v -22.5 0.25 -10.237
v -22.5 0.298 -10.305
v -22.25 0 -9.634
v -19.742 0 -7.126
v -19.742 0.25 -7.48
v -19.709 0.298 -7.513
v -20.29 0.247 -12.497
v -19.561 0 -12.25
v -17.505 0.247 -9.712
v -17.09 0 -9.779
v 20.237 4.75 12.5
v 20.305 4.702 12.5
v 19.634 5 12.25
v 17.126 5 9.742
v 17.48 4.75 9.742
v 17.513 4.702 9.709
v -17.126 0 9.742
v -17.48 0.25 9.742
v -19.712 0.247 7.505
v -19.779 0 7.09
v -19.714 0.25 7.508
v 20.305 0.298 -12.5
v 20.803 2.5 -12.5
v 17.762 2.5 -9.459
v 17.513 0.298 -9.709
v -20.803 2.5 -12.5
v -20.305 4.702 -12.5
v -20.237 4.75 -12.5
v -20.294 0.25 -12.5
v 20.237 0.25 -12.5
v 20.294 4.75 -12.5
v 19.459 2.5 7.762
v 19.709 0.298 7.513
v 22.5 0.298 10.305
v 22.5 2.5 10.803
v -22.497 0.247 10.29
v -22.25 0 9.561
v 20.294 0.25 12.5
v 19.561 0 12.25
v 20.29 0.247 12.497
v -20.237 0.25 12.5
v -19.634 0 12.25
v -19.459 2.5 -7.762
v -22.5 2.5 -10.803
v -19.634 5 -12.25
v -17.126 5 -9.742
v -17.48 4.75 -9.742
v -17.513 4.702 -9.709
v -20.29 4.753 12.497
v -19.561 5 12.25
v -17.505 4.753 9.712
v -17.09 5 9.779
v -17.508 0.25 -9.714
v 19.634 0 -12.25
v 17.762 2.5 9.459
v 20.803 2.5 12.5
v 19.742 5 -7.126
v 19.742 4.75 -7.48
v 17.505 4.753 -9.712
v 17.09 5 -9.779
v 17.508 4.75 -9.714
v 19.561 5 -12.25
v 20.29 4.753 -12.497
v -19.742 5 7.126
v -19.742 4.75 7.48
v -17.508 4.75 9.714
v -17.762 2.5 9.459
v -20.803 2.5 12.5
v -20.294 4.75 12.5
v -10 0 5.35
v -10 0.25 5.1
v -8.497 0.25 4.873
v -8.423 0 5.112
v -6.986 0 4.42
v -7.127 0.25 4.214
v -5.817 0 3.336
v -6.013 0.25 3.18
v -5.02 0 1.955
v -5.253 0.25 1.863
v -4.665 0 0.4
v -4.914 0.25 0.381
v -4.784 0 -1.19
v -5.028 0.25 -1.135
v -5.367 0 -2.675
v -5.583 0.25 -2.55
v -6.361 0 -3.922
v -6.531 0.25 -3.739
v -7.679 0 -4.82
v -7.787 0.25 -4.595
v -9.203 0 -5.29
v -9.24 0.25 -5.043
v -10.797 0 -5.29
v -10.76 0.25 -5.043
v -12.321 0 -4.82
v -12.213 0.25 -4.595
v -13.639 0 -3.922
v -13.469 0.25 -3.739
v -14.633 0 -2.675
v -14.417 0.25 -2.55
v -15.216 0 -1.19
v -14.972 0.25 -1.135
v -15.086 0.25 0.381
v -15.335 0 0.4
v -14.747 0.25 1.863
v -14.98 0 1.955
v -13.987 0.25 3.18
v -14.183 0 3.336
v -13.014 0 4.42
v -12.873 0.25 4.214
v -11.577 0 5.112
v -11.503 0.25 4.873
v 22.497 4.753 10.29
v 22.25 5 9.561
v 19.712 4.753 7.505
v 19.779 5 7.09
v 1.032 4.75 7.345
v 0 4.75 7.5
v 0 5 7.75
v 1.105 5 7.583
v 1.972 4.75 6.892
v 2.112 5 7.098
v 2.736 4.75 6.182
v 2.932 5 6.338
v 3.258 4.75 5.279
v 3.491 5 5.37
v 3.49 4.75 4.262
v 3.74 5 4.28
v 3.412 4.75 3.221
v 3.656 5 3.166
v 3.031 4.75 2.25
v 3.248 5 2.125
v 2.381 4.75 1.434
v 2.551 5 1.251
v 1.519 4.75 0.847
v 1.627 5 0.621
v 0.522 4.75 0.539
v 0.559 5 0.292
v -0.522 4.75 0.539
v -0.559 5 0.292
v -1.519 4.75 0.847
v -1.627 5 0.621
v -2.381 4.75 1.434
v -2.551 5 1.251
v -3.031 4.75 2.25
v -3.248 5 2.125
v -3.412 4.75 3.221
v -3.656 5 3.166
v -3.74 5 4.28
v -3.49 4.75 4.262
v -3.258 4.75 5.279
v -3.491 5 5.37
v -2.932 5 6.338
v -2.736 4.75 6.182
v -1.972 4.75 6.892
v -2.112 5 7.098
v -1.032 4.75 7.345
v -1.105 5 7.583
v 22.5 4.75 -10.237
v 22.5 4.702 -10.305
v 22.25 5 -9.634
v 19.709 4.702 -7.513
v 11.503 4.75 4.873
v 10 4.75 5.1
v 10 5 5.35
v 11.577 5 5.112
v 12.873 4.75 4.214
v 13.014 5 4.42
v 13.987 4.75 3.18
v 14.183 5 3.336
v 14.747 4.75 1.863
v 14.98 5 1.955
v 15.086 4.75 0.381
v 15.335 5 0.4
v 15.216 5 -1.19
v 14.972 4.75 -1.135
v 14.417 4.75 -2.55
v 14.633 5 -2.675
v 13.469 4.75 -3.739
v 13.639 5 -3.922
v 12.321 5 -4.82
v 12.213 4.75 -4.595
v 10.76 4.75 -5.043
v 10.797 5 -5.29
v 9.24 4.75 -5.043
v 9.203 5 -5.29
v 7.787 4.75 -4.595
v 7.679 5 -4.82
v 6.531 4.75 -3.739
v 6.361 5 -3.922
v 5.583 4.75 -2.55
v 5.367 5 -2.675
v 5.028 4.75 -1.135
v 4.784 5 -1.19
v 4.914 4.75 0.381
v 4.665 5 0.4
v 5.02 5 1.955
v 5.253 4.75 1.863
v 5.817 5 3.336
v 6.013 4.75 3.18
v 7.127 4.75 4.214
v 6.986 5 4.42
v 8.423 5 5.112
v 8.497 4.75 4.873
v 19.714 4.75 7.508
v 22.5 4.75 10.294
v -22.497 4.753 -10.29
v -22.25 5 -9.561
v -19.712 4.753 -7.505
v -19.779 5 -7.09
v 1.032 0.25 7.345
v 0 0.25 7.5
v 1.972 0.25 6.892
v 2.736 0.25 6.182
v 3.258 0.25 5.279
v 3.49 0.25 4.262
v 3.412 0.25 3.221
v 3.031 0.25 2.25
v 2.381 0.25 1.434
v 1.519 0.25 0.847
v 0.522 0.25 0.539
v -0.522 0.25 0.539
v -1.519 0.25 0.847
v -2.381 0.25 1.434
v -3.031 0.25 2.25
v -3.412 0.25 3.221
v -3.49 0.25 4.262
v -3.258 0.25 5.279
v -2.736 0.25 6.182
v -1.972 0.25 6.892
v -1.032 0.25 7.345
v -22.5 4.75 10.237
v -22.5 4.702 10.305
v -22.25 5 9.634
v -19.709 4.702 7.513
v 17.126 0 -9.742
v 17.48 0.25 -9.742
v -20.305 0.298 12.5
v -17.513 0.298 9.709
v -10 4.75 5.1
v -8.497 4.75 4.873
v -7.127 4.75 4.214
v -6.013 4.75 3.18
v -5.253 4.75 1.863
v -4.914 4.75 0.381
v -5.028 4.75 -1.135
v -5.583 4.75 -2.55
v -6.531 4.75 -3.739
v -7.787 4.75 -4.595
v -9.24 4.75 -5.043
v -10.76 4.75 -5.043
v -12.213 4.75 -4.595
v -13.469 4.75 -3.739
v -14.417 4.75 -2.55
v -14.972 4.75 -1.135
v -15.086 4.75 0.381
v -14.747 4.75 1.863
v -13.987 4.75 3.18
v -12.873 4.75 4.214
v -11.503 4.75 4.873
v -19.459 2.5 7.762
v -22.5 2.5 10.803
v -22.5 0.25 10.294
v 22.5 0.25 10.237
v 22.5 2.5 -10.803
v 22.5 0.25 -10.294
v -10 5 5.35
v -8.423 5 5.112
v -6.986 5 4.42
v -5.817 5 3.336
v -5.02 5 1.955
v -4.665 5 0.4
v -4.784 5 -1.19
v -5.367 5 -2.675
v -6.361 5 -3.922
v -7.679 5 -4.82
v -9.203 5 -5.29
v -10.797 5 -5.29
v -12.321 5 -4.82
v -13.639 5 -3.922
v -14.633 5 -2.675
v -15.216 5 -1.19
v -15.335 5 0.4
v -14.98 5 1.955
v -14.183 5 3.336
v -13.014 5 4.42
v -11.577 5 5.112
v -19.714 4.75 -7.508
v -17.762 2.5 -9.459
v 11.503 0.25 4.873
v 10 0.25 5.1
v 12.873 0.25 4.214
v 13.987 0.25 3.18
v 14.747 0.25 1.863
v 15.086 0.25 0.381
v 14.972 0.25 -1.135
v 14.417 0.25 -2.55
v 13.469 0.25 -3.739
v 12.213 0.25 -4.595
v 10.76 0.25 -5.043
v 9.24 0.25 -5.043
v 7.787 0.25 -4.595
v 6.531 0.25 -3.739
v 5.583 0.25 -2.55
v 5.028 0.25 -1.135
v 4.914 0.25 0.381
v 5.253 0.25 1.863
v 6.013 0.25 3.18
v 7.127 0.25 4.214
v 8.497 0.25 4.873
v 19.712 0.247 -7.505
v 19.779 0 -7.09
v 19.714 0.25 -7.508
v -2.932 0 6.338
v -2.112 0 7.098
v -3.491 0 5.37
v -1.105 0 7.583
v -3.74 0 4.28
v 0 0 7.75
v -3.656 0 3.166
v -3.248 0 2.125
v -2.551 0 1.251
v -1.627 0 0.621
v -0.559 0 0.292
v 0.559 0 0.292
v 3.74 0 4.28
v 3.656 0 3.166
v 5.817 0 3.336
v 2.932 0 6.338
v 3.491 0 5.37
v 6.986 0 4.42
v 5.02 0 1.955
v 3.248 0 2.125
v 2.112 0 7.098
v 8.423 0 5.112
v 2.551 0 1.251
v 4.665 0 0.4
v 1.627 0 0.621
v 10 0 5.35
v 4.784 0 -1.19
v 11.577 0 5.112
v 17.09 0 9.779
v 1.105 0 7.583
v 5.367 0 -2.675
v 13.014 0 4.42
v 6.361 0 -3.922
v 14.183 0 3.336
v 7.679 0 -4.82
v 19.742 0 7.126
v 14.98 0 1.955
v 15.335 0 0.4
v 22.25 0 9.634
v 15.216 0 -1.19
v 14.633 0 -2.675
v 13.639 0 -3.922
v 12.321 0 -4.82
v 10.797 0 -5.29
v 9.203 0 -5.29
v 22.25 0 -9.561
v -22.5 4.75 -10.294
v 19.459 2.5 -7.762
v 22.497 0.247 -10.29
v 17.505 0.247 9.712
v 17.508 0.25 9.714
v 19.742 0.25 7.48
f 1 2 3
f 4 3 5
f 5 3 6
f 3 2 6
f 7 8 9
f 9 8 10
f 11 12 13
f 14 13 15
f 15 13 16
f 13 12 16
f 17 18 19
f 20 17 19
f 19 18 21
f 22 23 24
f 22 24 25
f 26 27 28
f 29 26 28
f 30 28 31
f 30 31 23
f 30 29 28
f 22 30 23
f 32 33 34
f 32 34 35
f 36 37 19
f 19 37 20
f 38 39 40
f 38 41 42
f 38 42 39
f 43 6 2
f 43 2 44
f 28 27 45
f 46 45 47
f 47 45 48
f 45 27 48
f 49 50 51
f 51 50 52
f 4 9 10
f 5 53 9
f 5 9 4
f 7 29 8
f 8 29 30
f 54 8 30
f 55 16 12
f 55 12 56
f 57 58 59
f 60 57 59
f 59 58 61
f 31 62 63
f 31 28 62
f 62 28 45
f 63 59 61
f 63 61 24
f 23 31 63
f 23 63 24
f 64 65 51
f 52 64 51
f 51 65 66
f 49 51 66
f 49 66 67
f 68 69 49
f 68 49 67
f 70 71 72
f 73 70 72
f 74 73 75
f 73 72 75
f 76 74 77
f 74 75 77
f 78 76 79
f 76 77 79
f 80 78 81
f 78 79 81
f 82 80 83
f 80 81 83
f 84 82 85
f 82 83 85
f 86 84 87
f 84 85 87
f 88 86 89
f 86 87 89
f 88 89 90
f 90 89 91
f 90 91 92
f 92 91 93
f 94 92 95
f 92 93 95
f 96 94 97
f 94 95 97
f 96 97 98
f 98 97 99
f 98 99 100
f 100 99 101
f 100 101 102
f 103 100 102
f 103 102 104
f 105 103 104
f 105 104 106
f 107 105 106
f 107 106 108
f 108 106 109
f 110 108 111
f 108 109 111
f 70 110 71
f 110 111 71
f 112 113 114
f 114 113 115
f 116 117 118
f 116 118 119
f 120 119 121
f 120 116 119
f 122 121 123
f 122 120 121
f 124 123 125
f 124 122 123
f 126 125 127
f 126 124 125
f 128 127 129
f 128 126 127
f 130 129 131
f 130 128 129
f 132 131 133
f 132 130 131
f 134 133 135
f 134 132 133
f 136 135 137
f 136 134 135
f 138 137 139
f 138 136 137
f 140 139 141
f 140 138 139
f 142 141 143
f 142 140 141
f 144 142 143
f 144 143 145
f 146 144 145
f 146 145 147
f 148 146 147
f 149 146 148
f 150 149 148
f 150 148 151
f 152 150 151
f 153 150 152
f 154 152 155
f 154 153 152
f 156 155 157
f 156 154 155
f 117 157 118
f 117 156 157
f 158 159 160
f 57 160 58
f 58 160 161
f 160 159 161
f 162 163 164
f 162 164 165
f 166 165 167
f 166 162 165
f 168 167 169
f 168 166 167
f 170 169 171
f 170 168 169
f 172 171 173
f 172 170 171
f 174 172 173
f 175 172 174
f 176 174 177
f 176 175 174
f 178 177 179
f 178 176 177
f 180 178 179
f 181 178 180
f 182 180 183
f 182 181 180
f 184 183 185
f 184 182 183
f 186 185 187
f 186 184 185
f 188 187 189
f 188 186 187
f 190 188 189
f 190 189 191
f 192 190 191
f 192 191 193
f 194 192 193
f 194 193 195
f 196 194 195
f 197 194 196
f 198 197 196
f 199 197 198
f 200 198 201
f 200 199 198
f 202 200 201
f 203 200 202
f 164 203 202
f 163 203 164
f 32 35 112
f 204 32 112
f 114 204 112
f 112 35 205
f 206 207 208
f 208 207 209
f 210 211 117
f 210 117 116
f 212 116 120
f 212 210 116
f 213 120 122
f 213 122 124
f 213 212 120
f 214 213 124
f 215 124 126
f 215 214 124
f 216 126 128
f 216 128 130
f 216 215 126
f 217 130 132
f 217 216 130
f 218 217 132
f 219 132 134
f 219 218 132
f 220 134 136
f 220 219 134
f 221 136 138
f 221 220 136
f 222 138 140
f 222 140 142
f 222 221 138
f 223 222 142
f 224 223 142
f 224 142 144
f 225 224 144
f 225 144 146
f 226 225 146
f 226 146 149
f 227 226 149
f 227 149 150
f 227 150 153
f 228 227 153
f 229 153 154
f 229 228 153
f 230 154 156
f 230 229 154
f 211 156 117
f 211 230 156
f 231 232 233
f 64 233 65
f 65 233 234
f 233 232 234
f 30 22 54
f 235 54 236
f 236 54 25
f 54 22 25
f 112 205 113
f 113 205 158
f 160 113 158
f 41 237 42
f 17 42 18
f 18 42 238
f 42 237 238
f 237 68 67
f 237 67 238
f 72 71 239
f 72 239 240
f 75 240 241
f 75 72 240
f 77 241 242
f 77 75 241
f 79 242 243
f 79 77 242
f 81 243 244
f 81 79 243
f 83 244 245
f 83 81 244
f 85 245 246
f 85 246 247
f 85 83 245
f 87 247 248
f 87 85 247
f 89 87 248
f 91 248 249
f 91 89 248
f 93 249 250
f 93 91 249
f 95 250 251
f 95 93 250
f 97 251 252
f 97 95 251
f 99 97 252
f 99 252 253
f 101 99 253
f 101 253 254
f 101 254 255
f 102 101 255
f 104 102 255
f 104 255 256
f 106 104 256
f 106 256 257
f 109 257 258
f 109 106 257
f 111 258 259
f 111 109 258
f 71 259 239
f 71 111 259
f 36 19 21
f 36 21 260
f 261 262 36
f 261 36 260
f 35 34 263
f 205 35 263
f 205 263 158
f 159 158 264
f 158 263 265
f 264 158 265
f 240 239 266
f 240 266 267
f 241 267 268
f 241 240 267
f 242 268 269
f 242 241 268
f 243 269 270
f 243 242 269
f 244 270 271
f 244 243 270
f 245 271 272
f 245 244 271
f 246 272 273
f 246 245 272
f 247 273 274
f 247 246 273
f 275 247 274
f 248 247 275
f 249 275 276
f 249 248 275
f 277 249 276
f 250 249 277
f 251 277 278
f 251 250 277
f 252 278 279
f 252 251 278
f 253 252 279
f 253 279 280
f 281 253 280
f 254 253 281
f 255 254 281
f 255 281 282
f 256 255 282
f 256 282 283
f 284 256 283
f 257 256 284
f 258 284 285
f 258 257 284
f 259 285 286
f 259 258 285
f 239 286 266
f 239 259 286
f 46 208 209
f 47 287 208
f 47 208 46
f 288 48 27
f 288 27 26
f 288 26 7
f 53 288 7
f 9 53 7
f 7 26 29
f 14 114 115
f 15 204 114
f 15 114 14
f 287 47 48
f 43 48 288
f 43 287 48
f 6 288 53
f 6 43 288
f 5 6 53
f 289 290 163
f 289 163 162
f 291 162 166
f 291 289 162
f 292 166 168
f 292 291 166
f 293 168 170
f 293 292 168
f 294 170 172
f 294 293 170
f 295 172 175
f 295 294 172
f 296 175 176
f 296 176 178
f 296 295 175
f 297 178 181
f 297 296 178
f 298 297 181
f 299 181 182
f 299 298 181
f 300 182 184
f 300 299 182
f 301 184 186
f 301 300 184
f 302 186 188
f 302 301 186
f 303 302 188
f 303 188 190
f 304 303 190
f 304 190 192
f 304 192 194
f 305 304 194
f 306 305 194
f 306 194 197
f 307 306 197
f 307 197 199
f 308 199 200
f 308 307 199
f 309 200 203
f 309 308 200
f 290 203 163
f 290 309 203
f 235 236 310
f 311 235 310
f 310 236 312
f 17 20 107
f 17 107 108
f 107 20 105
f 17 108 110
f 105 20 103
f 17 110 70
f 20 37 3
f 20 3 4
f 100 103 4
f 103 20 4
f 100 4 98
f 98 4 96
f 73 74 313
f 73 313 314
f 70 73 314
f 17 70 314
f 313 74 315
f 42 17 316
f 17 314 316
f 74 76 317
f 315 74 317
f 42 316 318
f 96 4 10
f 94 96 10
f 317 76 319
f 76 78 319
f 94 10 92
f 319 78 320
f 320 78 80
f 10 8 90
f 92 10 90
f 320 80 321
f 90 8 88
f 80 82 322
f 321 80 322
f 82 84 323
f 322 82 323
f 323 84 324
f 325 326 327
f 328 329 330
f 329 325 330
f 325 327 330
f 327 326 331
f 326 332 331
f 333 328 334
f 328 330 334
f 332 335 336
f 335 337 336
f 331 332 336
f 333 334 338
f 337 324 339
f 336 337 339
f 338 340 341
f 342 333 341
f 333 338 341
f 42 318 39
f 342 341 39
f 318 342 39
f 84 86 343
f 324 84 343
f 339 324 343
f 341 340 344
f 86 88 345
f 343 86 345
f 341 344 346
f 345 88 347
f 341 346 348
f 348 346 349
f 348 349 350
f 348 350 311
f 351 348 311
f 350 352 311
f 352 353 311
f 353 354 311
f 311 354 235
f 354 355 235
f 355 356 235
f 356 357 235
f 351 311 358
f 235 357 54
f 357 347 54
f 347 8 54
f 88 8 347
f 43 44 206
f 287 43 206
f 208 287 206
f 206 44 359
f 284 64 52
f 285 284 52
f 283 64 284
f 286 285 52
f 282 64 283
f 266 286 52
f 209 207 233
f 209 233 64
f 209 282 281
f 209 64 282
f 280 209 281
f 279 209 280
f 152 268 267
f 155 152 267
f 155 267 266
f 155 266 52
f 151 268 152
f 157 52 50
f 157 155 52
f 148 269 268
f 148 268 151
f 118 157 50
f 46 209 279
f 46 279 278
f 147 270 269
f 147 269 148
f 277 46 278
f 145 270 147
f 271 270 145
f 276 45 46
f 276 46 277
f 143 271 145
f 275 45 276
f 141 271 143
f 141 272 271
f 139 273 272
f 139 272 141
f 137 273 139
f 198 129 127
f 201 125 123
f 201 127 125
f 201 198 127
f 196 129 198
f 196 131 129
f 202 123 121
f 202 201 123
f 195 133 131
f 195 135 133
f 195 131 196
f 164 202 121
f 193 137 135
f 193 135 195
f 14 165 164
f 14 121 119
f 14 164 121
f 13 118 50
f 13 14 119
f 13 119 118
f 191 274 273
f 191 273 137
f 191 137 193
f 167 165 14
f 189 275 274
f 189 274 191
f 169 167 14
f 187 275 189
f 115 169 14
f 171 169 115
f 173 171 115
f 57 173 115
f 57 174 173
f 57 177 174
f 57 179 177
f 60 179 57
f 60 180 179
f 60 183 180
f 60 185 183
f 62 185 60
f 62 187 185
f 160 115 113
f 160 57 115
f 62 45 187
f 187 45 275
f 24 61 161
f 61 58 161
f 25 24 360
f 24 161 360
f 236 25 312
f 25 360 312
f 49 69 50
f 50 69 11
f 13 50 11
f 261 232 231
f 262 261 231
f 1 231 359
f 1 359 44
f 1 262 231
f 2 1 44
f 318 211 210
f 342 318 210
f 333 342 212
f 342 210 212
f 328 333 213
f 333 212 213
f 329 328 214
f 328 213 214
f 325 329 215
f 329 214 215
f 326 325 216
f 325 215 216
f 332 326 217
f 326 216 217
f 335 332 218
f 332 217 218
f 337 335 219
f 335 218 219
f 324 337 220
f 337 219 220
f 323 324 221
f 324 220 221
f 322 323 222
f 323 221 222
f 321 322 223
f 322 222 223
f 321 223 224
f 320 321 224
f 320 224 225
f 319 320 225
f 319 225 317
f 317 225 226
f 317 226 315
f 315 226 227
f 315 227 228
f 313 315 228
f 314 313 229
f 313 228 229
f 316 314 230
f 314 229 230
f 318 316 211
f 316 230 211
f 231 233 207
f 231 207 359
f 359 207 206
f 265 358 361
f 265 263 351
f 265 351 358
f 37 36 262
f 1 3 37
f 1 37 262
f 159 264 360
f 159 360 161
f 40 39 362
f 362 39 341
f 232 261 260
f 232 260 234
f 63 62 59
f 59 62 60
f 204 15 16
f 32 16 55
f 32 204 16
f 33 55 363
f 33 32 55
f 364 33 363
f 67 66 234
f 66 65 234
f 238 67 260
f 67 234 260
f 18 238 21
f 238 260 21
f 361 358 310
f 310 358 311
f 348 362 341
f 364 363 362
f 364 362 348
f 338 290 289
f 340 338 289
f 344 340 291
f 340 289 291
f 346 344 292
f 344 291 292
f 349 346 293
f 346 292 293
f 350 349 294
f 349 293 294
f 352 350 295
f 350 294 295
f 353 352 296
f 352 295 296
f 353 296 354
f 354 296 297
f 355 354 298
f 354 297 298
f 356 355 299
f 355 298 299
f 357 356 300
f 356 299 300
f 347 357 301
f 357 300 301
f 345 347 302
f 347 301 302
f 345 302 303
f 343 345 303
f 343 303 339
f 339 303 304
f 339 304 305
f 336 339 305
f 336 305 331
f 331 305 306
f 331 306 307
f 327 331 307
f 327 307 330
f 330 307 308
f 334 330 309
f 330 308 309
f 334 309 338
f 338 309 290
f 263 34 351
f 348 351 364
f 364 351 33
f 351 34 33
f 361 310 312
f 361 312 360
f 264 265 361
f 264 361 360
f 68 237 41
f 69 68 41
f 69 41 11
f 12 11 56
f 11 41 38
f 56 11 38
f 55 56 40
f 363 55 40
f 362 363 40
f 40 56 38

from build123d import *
from OCP.BRepFilletAPI import BRepFilletAPI_MakeChamfer

# Parameters (mm, degrees)
SKETCH1_W            = 45
SKETCH1_H            = 25
SKETCH1_R            = 5.1
SKETCH1_R_2          = 3.5
BOSS_EXTRUDE1_DEPTH  = 5
CUT_EXTRUDE3_DEPTH   = 5.5
MIRROR2_COPY_1_DEPTH = 5.5
CHAMFER1_SIZE        = 0.25
CHAMFER1_SIZE2       = 0.301404498


with BuildPart() as part:
    # Sketch1 → Boss-Extrude1 (new body)
    with BuildSketch(Plane(origin=(0, 0, 0), x_dir=(1, 0, 0), z_dir=(0, 1, 0))):
        Rectangle(SKETCH1_W, SKETCH1_H)
        with Locations(Location((-10, 0, 0), (0, 0, 270))):
            Circle(SKETCH1_R, mode=Mode.SUBTRACT)
        with Locations(Location((10, 0, 0), (0, 0, 270))):
            Circle(SKETCH1_R, mode=Mode.SUBTRACT)
        with Locations(Location((0, -4, 0), (0, 0, 270))):
            Circle(SKETCH1_R_2, mode=Mode.SUBTRACT)
    extrude(amount=BOSS_EXTRUDE1_DEPTH)

    # Sketch4 → Cut-Extrude3 (cut)
    with BuildSketch(Plane(origin=(-17.5, 0, -17.5), x_dir=(0, -1, 0), z_dir=(-0.7071067811865488, 0, -0.7071067811865464))):
        Polygon((-5, 8.671067812), (-5, 5.471067812), (-2.5, 5.871067812), (0, 5.471067812), (0, 8.671067812), (-2.5, 8.271067812), align=None)
    cut_extrude3 = extrude(amount=-CUT_EXTRUDE3_DEPTH, mode=Mode.SUBTRACT)

    # Mirror1: Cut-Extrude3 across plane
    add(cut_extrude3.mirror(Plane.XY), mode=Mode.SUBTRACT)

    # Mirror2: Cut-Extrude3 across plane
    add(cut_extrude3.mirror(Plane(origin=(0, 0, 0), x_dir=(0, 0, 1), z_dir=(1, 0, 0))), mode=Mode.SUBTRACT)

    # Mirror2 copy 1 sketch → Mirror2 copy 1 (cut)
    with BuildSketch(Plane(origin=(17.5, 0, 17.5), x_dir=(0, -1, 0), z_dir=(0.7071067811865488, 0, 0.7071067811865464))):
        Polygon((-5, 8.671067812), (-5, 5.471067812), (-2.5, 5.871067812), (0, 5.471067812), (0, 8.671067812), (-2.5, 8.271067812), align=None)
    extrude(amount=-MIRROR2_COPY_1_DEPTH, mode=Mode.SUBTRACT)

    # Chamfer1: one chamfer whose edges measure the first distance from different faces: ONE call of the kernel's chamfer builder (chamfer() names one face for all edges)
    chamfer1_edges_1 = [part.edges().sort_by_distance(p)[0] for p in [
        (22.5, 5, 0),
        (22.5, 0, 0),
        (18.610912703, 0, 8.610912703),
        (18.610912703, 5, 8.610912703),
        (-10, 0, -5.1),
        (-10, 5, -5.1),
        (10, 0, -5.1),
        (10, 5, -5.1),
        (0, 0, 0.5),
        (0, 5, 0.5),
        (-22.5, 0, 0),
        (-22.5, 5, 0),
        (-18.610912703, 0, -8.610912703),
        (-18.610912703, 5, -8.610912703),
        (0, 0, 12.5),
        (0, 5, 12.5),
        (-18.610912703, 5, 8.610912703),
        (-18.610912703, 0, 8.610912703),
        (0, 0, -12.5),
        (0, 5, -12.5),
        (18.610912703, 5, -8.610912703),
        (18.610912703, 0, -8.610912703),
    ]]
    chamfer1_edges_2 = [part.edges().sort_by_distance(p)[0] for p in [
        (21.121141777, 5, 8.858400077),
    ]]
    chamfer1_side_2 = [part.faces().sort_by_distance(p)[0] for p in [
        (21.049281331, 3.729674797, 9.073981413),
    ]]
    chamfer1_edges_3 = [part.edges().sort_by_distance(p)[0] for p in [
        (21.121141777, 0, 8.858400077),
        (-21.121141777, 0, -8.858400077),
        (-18.858400077, 0, 11.121141777),
        (18.858400077, 0, -11.121141777),
    ]]
    chamfer1_side_3 = [part.faces().sort_by_distance(p)[0] for p in [
        (0, 0, -0.178389984),
    ]]
    chamfer1_edges_4 = [part.edges().sort_by_distance(p)[0] for p in [
        (18.858400077, 0, 11.121141777),
    ]]
    chamfer1_side_4 = [part.faces().sort_by_distance(p)[0] for p in [
        (19.073981413, 1.270325203, 11.049281331),
    ]]
    chamfer1_edges_5 = [part.edges().sort_by_distance(p)[0] for p in [
        (18.858400077, 5, 11.121141777),
        (-18.858400077, 5, -11.121141777),
        (-21.121141777, 5, 8.858400077),
        (21.121141777, 5, -8.858400077),
    ]]
    chamfer1_side_5 = [part.faces().sort_by_distance(p)[0] for p in [
        (0, 5, -0.178389984),
    ]]
    chamfer1_edges_6 = [part.edges().sort_by_distance(p)[0] for p in [
        (-21.121141777, 5, -8.858400077),
    ]]
    chamfer1_side_6 = [part.faces().sort_by_distance(p)[0] for p in [
        (-21.049281331, 3.729674797, -9.073981413),
    ]]
    chamfer1_edges_7 = [part.edges().sort_by_distance(p)[0] for p in [
        (-18.858400077, 0, -11.121141777),
    ]]
    chamfer1_side_7 = [part.faces().sort_by_distance(p)[0] for p in [
        (-19.073981413, 1.270325203, -11.049281331),
    ]]
    chamfer1_edges_8 = [part.edges().sort_by_distance(p)[0] for p in [
        (-21.121141777, 0, 8.858400077),
    ]]
    chamfer1_side_8 = [part.faces().sort_by_distance(p)[0] for p in [
        (-21.049281331, 1.270325203, 9.073981413),
    ]]
    chamfer1_edges_9 = [part.edges().sort_by_distance(p)[0] for p in [
        (-18.858400077, 5, 11.121141777),
    ]]
    chamfer1_side_9 = [part.faces().sort_by_distance(p)[0] for p in [
        (-19.073981413, 3.729674797, 11.049281331),
    ]]
    chamfer1_edges_10 = [part.edges().sort_by_distance(p)[0] for p in [
        (21.121141777, 0, -8.858400077),
    ]]
    chamfer1_side_10 = [part.faces().sort_by_distance(p)[0] for p in [
        (21.049281331, 1.270325203, -9.073981413),
    ]]
    chamfer1_edges_11 = [part.edges().sort_by_distance(p)[0] for p in [
        (18.858400077, 5, -11.121141777),
    ]]
    chamfer1_side_11 = [part.faces().sort_by_distance(p)[0] for p in [
        (19.073981413, 3.729674797, -11.049281331),
    ]]
    chamfer1 = BRepFilletAPI_MakeChamfer(part.part.solid().wrapped)
    for e in chamfer1_edges_1:
        chamfer1.Add(CHAMFER1_SIZE, e.wrapped)
    for e in chamfer1_edges_2:
        chamfer1.Add(CHAMFER1_SIZE, CHAMFER1_SIZE2, e.wrapped, chamfer1_side_2[0].wrapped)  # the first distance lies on this face
    for e in chamfer1_edges_3:
        chamfer1.Add(CHAMFER1_SIZE, CHAMFER1_SIZE2, e.wrapped, chamfer1_side_3[0].wrapped)  # the first distance lies on this face
    for e in chamfer1_edges_4:
        chamfer1.Add(CHAMFER1_SIZE, CHAMFER1_SIZE2, e.wrapped, chamfer1_side_4[0].wrapped)  # the first distance lies on this face
    for e in chamfer1_edges_5:
        chamfer1.Add(CHAMFER1_SIZE, CHAMFER1_SIZE2, e.wrapped, chamfer1_side_5[0].wrapped)  # the first distance lies on this face
    for e in chamfer1_edges_6:
        chamfer1.Add(CHAMFER1_SIZE, CHAMFER1_SIZE2, e.wrapped, chamfer1_side_6[0].wrapped)  # the first distance lies on this face
    for e in chamfer1_edges_7:
        chamfer1.Add(CHAMFER1_SIZE, CHAMFER1_SIZE2, e.wrapped, chamfer1_side_7[0].wrapped)  # the first distance lies on this face
    for e in chamfer1_edges_8:
        chamfer1.Add(CHAMFER1_SIZE, CHAMFER1_SIZE2, e.wrapped, chamfer1_side_8[0].wrapped)  # the first distance lies on this face
    for e in chamfer1_edges_9:
        chamfer1.Add(CHAMFER1_SIZE, CHAMFER1_SIZE2, e.wrapped, chamfer1_side_9[0].wrapped)  # the first distance lies on this face
    for e in chamfer1_edges_10:
        chamfer1.Add(CHAMFER1_SIZE, CHAMFER1_SIZE2, e.wrapped, chamfer1_side_10[0].wrapped)  # the first distance lies on this face
    for e in chamfer1_edges_11:
        chamfer1.Add(CHAMFER1_SIZE, CHAMFER1_SIZE2, e.wrapped, chamfer1_side_11[0].wrapped)  # the first distance lies on this face
    add(Compound.cast(chamfer1.Shape()), mode=Mode.REPLACE)


solid = part.part
